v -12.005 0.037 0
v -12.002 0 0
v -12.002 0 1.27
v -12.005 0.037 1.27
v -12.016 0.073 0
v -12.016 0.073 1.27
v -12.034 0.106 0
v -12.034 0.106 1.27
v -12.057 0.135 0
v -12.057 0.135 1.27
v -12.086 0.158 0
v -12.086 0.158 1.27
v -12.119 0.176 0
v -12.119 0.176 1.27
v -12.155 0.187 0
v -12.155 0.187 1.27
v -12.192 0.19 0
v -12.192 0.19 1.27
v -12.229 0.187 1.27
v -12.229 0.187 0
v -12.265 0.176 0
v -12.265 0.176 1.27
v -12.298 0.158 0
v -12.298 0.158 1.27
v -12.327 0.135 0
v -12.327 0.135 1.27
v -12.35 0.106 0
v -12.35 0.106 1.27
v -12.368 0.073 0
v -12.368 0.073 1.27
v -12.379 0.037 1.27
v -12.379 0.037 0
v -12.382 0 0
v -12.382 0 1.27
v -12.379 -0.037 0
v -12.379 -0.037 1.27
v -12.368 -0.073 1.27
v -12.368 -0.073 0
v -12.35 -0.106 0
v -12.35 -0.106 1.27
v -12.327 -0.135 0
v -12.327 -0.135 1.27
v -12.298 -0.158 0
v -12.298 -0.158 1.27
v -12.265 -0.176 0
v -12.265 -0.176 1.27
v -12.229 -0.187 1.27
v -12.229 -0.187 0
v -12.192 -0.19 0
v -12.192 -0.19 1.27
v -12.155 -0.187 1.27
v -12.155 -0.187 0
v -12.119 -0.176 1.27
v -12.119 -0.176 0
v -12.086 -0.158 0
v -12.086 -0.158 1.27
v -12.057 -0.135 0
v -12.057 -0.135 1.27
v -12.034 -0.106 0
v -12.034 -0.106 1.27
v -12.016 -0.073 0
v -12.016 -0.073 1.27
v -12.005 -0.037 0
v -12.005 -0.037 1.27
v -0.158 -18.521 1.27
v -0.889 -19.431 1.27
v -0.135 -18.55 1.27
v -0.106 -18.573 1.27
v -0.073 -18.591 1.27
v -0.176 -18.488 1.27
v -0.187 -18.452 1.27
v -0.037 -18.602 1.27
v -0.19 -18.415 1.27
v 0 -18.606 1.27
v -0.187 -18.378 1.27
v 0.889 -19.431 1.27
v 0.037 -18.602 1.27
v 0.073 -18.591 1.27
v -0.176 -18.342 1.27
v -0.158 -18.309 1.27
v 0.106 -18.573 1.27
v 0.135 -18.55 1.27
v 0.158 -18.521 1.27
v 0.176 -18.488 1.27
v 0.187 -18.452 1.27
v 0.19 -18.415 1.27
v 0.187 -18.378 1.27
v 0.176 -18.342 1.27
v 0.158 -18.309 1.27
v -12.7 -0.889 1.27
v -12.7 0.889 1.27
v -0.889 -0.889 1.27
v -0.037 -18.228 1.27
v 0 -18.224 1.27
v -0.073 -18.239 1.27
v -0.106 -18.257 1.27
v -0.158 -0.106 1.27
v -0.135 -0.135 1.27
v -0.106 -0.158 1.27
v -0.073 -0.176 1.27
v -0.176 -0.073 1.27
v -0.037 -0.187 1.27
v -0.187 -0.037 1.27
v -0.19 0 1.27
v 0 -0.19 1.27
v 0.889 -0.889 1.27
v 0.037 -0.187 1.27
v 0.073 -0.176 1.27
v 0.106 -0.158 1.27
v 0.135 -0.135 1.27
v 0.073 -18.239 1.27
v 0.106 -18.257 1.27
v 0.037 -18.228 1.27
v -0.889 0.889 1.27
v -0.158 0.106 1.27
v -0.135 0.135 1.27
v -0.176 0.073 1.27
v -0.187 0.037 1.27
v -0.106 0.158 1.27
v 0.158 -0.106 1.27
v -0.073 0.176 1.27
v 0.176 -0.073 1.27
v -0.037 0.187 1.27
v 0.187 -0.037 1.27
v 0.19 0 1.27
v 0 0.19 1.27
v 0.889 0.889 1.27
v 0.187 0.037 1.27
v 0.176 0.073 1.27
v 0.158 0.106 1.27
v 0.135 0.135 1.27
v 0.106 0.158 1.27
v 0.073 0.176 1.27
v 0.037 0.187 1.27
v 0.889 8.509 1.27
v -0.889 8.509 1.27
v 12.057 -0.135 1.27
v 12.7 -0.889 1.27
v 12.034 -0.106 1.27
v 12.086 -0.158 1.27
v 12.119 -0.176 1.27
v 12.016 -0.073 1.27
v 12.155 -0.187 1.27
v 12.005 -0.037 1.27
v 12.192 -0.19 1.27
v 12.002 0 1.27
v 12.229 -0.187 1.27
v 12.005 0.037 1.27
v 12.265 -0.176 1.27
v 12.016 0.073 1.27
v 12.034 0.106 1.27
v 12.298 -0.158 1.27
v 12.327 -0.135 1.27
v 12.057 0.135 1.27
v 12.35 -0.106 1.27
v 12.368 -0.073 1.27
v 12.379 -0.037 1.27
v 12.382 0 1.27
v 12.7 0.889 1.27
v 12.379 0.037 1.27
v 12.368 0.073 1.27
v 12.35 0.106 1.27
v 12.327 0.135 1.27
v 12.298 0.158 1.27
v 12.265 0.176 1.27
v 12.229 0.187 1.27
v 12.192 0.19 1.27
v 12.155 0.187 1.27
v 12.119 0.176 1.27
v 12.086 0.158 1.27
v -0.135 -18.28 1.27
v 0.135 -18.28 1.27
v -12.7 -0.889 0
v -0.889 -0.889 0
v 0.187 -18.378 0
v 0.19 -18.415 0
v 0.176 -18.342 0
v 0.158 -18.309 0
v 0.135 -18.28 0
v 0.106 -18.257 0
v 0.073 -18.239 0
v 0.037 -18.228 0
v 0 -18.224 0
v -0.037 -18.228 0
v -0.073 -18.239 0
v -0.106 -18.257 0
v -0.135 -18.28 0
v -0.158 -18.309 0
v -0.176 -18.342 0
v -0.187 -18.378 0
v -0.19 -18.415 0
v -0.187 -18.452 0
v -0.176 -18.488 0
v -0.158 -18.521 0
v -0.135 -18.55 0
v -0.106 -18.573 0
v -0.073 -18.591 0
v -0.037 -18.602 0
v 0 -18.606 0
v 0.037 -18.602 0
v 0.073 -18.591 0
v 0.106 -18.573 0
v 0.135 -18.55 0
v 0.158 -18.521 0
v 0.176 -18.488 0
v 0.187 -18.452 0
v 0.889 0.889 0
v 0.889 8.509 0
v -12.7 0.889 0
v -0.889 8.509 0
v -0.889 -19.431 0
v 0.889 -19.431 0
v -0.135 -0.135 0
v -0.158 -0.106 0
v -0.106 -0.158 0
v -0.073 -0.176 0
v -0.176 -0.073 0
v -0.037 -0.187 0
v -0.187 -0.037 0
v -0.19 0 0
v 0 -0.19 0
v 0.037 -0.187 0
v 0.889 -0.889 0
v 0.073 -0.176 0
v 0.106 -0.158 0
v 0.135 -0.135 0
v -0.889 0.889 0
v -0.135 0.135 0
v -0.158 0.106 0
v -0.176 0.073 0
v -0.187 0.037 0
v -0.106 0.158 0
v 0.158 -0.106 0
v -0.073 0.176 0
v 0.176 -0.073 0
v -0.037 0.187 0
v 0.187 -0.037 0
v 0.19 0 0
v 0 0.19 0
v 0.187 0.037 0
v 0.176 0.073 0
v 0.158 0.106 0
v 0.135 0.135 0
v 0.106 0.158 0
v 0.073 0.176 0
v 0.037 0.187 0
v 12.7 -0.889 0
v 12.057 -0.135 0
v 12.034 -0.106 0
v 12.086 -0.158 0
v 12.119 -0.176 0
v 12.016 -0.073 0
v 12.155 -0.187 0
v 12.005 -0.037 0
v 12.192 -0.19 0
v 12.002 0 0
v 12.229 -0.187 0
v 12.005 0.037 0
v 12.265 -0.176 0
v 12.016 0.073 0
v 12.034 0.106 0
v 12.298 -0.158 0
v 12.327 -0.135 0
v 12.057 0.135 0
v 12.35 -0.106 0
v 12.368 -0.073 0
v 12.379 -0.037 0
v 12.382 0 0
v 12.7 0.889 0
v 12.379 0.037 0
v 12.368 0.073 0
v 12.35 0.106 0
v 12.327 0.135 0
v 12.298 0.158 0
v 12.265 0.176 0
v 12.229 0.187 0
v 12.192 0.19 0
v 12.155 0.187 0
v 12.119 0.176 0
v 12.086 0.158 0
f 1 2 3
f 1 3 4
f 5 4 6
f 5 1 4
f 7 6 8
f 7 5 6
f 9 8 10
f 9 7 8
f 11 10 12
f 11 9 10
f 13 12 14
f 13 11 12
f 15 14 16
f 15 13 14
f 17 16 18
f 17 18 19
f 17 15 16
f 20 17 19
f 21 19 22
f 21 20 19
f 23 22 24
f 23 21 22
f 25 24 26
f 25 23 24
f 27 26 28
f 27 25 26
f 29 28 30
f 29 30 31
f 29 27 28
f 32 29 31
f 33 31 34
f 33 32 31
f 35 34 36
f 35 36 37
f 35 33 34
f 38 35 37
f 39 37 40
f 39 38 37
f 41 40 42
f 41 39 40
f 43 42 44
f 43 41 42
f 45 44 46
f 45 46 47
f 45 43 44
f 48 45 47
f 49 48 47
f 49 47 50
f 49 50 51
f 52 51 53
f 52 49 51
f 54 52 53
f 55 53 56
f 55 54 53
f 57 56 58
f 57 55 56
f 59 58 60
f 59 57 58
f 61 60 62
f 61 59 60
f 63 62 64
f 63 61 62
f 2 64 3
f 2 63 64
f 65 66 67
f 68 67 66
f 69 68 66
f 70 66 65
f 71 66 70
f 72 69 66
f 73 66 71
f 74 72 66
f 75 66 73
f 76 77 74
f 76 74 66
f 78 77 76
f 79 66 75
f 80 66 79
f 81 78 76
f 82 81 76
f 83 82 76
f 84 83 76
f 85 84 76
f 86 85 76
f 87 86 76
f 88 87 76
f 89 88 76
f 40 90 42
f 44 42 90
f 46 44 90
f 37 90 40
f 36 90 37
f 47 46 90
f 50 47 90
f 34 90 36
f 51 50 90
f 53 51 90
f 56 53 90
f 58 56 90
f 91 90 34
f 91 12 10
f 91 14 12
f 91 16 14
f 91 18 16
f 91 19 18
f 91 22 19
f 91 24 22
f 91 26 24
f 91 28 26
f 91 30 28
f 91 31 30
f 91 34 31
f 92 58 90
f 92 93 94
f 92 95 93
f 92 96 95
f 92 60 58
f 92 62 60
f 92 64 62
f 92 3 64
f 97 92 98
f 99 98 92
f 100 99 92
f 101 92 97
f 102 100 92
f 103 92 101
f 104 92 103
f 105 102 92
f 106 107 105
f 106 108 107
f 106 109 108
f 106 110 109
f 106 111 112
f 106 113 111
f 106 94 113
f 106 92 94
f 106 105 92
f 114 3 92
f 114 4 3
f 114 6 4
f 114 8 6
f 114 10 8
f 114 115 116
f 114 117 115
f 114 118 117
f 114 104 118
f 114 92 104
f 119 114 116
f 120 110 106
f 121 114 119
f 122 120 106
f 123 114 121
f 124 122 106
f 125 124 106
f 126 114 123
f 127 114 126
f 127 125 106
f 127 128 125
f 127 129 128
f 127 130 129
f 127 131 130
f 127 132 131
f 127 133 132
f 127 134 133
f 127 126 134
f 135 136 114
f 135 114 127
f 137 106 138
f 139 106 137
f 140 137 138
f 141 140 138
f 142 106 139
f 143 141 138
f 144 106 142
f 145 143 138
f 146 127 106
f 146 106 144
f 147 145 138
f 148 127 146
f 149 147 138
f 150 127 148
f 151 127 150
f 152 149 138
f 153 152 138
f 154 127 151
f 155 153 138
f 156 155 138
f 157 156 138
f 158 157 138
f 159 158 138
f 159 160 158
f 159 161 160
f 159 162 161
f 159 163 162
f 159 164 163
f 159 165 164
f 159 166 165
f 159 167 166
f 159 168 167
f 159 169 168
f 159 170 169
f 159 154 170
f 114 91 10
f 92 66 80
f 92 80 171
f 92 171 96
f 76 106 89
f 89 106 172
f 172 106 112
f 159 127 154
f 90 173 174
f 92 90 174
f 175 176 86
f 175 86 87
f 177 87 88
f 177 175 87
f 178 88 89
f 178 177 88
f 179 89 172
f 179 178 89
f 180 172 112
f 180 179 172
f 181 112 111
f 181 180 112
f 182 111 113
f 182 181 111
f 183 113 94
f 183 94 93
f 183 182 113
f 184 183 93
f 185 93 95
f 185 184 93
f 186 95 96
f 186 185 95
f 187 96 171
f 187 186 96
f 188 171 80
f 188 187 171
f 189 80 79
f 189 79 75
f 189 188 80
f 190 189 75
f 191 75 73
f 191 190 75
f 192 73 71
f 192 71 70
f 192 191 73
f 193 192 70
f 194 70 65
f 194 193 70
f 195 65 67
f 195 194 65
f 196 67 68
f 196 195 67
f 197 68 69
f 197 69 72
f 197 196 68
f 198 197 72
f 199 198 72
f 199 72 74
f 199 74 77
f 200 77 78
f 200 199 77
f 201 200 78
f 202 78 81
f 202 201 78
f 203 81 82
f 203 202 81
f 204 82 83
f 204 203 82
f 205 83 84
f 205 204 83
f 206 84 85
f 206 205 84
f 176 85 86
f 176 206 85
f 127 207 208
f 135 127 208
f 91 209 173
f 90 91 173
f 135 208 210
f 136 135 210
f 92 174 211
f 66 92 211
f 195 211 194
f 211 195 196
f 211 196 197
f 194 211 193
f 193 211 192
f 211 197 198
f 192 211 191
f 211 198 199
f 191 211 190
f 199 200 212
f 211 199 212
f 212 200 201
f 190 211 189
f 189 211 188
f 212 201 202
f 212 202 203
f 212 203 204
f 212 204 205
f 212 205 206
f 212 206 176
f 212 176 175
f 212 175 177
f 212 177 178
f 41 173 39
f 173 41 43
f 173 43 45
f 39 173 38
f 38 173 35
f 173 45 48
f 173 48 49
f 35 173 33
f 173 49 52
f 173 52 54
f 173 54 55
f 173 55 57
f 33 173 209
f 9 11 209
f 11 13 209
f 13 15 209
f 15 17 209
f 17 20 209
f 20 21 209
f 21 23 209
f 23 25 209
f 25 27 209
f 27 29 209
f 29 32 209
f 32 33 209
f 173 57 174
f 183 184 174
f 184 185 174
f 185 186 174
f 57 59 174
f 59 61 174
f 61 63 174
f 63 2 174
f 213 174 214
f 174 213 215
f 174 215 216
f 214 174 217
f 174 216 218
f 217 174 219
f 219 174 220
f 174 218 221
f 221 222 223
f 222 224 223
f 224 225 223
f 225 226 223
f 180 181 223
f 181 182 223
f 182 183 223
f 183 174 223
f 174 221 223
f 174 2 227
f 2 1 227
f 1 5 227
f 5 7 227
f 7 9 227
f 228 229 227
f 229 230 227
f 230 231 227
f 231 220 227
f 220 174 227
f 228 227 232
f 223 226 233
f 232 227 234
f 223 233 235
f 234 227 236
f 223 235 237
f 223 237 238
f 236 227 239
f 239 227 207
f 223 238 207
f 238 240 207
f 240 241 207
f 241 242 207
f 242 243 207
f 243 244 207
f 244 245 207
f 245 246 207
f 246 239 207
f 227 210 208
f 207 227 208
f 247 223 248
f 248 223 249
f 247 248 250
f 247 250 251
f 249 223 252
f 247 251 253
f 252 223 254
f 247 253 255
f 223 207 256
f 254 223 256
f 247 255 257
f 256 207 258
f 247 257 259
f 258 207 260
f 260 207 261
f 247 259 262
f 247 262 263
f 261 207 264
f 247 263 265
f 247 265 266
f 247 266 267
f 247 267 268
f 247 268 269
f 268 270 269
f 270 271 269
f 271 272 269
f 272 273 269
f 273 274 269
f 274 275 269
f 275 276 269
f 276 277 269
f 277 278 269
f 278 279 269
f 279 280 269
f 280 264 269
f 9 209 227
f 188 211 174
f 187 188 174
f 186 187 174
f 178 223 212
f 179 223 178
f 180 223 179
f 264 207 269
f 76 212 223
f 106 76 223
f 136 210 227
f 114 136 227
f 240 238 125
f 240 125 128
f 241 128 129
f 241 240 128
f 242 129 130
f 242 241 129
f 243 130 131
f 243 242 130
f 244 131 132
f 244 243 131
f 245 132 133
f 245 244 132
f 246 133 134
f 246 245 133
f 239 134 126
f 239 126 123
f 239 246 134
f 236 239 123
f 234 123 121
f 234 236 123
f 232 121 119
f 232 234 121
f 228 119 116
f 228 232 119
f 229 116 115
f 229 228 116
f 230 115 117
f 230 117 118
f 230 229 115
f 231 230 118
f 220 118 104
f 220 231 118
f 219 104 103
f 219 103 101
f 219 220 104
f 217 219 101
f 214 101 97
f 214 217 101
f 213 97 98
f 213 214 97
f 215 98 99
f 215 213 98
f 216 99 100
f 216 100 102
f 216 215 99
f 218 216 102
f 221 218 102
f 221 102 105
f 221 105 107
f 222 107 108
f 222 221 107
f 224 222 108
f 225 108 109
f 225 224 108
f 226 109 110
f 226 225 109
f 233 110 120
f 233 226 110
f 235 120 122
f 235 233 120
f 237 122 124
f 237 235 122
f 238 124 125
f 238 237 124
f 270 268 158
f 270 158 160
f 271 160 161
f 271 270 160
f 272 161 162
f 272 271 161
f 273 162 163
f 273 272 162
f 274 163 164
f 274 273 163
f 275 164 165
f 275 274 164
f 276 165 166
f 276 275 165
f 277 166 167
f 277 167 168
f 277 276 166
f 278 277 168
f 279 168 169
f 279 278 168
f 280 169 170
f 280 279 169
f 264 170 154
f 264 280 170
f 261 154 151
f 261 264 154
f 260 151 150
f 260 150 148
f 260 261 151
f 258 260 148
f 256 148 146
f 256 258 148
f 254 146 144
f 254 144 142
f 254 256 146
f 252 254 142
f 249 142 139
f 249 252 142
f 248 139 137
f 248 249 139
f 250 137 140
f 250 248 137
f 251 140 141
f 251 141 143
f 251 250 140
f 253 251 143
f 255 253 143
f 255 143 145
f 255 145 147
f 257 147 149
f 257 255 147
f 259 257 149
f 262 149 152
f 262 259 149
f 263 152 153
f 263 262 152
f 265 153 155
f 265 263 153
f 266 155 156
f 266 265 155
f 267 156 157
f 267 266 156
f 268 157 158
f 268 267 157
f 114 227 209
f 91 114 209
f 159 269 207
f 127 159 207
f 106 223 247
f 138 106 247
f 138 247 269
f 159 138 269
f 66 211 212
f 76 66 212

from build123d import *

# Parameters (mm, degrees)
F0_R     = 0.1905
F1_DEPTH = 1.27


with BuildPart() as f1:
    # F0 (on Top) → F1 (new body)
    with BuildSketch(Plane.XY):
        Polygon((-0.889, 0.889), (-12.7, 0.889), (-12.7, -0.889), (-0.889, -0.889), (-0.889, -19.431), (0.889, -19.431), (0.889, -0.889), (12.7, -0.889), (12.7, 0.889), (0.889, 0.889), (0.889, 8.509), (-0.889, 8.509), align=None)
        with Locations((0, -18.415)):
            Circle(F0_R, mode=Mode.SUBTRACT)
        with Locations((-12.192, 0)):
            Circle(F0_R, mode=Mode.SUBTRACT)
        Circle(F0_R, mode=Mode.SUBTRACT)
        with Locations((12.192, 0)):
            Circle(F0_R, mode=Mode.SUBTRACT)
    extrude(amount=F1_DEPTH)


solid = f1.part
